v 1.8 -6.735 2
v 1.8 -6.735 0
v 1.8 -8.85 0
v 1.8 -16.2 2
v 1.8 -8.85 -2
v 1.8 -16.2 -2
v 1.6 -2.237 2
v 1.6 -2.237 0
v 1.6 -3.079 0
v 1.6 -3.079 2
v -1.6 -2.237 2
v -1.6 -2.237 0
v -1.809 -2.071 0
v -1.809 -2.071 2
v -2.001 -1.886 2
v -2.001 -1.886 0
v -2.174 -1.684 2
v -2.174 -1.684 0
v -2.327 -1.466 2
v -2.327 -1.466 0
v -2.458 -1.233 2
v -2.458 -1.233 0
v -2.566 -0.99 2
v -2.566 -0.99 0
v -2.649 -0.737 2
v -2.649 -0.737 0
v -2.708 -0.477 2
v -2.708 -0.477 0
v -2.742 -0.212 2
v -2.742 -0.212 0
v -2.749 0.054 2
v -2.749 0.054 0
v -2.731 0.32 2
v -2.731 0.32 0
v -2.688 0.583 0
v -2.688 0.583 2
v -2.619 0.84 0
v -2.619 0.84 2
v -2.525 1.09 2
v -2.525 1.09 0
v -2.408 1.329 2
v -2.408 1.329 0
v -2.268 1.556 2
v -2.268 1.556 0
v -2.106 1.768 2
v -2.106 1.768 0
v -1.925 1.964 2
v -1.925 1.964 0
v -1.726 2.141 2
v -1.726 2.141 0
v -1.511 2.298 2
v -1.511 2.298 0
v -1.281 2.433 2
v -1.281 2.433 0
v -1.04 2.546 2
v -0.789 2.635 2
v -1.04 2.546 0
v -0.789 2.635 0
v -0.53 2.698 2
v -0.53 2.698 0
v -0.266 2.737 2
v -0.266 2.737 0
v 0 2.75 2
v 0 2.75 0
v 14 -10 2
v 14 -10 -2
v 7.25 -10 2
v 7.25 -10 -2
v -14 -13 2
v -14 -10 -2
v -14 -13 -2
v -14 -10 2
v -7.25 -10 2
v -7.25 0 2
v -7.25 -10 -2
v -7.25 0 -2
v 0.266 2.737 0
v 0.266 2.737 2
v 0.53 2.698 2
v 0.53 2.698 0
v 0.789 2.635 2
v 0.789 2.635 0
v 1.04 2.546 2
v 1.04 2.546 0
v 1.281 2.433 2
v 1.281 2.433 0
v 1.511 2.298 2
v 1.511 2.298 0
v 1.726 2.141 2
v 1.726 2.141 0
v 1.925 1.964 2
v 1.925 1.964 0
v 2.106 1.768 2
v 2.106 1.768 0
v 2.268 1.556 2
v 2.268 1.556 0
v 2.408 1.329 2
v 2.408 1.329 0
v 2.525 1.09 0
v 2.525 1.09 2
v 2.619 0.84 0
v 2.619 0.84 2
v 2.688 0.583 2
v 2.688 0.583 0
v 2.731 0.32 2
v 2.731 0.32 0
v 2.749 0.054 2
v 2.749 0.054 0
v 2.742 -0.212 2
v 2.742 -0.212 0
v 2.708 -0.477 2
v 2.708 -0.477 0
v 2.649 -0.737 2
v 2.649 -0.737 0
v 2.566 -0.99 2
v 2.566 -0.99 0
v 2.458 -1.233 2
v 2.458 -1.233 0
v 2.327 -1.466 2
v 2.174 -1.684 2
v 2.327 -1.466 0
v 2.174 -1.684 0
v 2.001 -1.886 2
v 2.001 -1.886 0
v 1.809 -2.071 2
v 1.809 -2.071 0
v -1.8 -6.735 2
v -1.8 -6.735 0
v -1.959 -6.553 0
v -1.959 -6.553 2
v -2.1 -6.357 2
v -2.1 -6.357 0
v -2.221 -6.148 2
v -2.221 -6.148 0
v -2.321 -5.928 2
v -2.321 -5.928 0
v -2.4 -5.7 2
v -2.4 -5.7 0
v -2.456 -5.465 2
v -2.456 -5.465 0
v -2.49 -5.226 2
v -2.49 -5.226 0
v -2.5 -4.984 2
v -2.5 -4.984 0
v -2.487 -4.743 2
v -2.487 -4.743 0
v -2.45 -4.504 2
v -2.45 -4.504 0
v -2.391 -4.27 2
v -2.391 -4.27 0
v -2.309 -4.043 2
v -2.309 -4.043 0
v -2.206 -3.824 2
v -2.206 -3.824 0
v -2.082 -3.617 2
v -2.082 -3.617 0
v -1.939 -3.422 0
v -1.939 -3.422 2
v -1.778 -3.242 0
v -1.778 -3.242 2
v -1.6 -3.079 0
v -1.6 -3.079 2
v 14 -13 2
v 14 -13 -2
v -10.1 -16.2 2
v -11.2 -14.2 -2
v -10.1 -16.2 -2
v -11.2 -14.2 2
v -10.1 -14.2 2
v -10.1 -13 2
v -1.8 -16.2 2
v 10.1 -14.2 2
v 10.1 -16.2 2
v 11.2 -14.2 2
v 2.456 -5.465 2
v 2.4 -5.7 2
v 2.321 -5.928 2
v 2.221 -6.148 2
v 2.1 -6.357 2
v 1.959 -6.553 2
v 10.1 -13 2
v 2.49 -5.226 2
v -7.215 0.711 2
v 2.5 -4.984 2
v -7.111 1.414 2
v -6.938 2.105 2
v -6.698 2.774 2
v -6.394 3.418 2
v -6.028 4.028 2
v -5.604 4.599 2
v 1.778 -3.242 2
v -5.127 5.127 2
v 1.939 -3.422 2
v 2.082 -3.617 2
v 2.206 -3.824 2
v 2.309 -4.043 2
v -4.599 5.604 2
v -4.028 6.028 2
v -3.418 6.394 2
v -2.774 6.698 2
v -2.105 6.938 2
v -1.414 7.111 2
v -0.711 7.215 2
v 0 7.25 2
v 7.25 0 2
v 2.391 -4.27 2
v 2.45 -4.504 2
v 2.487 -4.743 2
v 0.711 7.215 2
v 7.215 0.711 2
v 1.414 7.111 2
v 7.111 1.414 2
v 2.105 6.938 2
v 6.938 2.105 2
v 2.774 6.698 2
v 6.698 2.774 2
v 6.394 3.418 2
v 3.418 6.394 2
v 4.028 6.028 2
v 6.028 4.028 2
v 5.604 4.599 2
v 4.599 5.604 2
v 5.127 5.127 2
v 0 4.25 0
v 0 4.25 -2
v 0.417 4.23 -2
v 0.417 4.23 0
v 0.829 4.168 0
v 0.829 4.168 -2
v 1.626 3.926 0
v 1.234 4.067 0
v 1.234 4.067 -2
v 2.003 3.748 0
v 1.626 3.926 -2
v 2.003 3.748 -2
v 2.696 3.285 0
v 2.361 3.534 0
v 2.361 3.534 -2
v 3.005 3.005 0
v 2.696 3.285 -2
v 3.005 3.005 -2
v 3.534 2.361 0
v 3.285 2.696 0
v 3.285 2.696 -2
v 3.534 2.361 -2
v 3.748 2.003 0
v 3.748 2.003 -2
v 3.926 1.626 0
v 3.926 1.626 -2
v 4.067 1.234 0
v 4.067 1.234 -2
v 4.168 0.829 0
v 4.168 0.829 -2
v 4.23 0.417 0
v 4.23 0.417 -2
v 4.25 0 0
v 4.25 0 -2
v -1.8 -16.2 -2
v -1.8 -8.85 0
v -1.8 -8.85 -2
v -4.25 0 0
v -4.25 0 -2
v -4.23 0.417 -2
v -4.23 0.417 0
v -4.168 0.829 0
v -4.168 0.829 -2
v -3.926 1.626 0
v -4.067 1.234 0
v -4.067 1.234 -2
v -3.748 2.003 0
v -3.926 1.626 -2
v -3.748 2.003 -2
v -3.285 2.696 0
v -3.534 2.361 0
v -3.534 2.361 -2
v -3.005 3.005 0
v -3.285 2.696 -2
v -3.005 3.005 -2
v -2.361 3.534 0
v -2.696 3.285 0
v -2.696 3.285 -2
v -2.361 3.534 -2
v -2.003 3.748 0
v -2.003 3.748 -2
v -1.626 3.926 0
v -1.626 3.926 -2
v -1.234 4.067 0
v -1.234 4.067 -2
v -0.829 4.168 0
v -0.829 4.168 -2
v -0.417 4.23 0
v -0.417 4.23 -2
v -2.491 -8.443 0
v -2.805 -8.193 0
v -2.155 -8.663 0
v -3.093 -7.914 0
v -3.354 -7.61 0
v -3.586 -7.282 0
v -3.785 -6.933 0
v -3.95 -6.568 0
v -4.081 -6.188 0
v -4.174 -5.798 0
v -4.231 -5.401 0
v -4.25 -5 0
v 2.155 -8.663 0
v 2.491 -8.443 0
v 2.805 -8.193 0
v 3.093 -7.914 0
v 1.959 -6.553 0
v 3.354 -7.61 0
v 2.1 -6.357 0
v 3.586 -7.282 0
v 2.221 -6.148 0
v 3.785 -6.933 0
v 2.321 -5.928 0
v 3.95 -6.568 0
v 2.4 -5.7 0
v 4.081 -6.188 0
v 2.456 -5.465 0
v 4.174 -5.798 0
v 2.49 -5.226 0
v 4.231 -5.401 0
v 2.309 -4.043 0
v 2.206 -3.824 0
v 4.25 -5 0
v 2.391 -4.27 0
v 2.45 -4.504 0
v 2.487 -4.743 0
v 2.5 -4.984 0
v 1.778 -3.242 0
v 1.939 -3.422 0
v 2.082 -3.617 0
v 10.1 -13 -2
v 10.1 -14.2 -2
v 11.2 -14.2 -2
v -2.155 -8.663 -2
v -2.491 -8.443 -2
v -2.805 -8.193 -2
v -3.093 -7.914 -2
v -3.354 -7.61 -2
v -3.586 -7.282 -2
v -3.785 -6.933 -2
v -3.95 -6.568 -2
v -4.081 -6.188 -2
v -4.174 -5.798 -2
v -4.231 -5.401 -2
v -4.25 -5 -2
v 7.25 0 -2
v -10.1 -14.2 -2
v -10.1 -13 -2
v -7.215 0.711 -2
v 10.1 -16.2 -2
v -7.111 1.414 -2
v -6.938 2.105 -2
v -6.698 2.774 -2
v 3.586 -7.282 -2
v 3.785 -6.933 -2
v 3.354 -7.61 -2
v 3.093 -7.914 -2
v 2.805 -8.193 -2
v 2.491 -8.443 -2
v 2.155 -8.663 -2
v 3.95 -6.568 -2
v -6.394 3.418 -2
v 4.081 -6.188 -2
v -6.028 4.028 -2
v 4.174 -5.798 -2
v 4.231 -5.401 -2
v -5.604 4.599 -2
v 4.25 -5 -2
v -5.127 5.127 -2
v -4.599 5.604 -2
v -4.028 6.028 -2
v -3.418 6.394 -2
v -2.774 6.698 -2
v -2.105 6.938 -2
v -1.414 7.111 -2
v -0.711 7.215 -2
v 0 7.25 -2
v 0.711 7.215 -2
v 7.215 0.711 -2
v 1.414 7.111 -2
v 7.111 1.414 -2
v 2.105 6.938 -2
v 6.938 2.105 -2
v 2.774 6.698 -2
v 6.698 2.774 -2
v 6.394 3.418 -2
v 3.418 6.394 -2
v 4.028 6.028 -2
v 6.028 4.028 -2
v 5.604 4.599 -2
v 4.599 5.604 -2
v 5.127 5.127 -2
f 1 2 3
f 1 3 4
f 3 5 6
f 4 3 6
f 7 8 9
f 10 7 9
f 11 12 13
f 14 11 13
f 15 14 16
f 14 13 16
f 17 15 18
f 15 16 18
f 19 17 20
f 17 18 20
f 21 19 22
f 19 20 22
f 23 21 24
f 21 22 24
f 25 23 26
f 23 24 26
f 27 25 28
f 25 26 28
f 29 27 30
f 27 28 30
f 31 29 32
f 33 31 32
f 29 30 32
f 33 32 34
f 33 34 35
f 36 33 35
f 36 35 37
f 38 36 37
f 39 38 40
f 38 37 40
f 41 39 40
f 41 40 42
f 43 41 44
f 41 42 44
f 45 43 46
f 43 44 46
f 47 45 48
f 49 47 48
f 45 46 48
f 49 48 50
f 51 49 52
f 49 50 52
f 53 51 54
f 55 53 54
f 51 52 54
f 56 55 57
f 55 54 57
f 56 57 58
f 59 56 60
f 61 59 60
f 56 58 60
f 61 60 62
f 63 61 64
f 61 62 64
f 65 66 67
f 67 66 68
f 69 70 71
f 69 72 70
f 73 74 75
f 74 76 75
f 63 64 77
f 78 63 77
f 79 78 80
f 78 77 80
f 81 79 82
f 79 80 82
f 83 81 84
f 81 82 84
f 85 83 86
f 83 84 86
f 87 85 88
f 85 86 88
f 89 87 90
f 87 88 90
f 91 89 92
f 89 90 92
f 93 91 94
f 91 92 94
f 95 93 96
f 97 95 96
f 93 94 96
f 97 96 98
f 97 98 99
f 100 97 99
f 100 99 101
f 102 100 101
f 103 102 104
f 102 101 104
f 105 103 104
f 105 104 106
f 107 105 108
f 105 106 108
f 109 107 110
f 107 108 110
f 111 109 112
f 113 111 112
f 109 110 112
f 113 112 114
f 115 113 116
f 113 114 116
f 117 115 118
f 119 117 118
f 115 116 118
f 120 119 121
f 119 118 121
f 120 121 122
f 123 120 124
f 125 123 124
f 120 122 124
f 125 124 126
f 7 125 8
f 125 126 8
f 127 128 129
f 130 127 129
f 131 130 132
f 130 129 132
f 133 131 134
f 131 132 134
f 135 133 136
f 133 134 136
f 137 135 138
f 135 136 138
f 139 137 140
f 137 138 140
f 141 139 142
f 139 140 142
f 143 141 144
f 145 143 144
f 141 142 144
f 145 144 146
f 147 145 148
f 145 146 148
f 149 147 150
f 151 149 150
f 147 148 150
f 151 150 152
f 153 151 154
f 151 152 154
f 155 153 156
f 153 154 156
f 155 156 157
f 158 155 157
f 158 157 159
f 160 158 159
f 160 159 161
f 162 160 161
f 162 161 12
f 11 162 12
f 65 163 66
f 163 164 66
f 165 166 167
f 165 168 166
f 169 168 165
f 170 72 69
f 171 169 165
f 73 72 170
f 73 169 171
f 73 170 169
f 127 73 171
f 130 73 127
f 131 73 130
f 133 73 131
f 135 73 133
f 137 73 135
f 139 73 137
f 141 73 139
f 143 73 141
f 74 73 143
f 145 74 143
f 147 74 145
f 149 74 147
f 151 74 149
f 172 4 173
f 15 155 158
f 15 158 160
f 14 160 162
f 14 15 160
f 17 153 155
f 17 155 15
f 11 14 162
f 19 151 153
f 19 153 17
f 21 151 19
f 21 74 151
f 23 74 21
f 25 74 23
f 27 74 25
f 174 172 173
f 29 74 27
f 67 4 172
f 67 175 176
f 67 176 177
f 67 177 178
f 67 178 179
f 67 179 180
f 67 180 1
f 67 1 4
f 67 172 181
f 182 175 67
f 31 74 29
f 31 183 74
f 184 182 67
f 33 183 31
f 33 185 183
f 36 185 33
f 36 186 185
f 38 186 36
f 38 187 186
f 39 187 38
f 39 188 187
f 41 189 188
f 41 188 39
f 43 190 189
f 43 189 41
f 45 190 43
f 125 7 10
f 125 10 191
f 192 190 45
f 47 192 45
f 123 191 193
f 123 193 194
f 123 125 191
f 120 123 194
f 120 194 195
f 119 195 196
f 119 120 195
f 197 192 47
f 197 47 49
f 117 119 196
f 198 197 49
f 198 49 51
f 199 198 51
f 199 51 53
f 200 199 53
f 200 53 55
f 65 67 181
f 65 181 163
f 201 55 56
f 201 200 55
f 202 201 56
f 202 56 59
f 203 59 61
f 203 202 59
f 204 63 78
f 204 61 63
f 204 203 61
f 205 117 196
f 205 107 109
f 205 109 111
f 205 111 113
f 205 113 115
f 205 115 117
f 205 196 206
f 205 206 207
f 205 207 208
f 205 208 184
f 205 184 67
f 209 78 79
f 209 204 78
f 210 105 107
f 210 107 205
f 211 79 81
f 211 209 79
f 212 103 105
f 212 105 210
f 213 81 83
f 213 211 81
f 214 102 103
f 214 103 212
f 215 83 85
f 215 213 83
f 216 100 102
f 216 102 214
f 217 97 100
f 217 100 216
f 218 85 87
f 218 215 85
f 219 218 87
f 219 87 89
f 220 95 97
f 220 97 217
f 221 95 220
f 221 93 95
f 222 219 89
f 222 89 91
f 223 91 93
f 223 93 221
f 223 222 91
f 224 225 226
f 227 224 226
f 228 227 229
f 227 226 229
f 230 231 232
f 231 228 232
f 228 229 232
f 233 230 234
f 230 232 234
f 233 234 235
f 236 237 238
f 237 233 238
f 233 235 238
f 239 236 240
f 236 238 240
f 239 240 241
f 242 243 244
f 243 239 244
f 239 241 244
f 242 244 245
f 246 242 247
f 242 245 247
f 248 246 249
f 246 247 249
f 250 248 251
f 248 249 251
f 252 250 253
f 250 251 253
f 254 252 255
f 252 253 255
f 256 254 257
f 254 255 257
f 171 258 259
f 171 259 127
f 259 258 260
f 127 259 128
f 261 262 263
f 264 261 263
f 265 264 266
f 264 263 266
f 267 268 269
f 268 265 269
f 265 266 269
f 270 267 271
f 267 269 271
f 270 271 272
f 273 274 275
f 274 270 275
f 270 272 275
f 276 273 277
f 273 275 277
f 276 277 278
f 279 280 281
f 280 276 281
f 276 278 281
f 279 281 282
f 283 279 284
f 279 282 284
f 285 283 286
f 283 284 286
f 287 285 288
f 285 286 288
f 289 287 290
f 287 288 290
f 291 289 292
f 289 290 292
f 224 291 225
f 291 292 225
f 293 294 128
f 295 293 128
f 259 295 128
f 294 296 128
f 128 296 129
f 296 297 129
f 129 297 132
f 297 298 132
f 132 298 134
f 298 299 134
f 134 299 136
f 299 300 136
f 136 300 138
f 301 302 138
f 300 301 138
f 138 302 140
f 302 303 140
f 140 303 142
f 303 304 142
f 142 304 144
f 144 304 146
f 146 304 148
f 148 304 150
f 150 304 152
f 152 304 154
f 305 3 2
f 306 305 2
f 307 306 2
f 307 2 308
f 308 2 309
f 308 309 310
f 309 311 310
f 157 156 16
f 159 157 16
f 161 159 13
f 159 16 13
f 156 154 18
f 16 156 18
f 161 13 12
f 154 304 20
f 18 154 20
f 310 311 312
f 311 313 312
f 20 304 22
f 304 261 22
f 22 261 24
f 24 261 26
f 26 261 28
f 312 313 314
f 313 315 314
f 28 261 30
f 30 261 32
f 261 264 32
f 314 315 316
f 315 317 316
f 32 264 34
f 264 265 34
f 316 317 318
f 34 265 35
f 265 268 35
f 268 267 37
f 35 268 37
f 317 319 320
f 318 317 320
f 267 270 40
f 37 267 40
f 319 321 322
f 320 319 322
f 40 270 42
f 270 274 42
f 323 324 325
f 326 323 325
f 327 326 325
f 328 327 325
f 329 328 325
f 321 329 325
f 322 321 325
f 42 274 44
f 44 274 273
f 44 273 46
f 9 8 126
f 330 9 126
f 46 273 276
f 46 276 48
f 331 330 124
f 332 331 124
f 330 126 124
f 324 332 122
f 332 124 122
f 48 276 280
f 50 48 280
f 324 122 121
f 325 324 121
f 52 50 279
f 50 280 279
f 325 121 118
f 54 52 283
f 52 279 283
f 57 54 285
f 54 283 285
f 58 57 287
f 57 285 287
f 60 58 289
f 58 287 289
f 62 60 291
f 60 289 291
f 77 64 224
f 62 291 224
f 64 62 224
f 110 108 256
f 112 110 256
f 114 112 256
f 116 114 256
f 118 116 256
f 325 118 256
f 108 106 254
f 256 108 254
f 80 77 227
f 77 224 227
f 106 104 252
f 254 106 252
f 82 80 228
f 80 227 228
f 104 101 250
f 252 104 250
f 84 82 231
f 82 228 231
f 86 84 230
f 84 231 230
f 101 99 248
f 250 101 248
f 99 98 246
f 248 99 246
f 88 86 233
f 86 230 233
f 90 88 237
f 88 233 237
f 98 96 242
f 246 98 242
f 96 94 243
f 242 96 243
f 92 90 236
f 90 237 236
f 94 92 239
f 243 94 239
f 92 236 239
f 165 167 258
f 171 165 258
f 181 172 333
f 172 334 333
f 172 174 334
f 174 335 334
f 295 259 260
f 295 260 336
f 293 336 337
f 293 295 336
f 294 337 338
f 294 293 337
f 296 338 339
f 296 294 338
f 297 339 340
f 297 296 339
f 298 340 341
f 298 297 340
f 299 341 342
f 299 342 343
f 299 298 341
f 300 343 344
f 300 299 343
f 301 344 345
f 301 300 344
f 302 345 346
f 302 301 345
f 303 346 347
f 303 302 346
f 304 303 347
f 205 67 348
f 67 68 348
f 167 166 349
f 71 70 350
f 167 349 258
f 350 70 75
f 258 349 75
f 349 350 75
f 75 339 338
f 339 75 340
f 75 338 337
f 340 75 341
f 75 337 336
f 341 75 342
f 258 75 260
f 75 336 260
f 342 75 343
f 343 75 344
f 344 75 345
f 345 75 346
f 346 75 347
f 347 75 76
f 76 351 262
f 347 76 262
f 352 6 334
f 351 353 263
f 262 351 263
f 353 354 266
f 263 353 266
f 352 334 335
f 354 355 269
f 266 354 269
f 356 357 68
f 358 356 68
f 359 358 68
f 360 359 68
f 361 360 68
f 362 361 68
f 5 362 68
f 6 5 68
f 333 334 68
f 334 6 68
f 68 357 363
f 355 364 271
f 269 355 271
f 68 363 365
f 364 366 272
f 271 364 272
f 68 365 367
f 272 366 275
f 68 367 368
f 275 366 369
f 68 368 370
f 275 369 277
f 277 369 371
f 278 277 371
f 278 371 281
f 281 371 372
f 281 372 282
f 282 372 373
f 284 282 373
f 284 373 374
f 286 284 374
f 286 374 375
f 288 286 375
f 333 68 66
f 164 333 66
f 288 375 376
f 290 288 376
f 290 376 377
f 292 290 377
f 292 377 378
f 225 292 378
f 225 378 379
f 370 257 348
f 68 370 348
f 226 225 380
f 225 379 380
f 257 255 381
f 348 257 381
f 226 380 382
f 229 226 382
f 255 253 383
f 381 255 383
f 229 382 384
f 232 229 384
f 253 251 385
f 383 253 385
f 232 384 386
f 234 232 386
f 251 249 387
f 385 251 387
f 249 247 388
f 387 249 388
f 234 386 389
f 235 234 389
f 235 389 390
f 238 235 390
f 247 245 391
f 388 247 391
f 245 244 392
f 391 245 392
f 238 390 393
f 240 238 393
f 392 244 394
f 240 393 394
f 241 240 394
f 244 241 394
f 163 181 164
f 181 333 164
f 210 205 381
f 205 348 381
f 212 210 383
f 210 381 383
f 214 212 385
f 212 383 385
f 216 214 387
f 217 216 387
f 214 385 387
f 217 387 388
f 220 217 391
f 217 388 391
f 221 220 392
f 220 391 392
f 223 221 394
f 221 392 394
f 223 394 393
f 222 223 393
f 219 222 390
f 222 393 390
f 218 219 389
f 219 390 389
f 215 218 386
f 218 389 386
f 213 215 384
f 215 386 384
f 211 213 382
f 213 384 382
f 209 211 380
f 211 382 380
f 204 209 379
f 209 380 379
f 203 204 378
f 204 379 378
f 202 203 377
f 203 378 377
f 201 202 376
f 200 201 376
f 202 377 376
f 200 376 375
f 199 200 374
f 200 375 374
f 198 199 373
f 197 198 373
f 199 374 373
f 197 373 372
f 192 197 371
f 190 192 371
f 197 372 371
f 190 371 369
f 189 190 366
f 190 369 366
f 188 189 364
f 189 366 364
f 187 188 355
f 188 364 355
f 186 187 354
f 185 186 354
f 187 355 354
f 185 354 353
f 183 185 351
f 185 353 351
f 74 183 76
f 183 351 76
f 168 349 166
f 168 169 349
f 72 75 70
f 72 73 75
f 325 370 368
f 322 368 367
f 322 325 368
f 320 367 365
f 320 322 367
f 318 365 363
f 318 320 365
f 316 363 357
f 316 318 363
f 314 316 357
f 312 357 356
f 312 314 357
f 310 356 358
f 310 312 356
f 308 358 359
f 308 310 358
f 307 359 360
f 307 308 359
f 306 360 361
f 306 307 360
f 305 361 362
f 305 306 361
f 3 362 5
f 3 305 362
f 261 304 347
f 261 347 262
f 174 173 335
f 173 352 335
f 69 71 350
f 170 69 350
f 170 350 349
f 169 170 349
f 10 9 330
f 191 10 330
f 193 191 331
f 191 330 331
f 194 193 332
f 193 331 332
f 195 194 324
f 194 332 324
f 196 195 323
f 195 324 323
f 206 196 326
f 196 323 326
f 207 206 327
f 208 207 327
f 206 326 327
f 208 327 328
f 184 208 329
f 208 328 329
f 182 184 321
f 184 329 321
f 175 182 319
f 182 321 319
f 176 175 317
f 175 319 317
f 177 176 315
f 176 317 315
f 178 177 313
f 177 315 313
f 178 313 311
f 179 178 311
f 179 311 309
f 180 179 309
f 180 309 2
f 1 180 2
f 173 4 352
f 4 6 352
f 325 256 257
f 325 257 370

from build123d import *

# Parameters (mm, degrees)
F1_DEPTH = 2
F2_DEPTH = 2


with BuildPart() as f1:
    # F0 (on Top) → F1 (new body, symmetric)
    with BuildSketch(Plane.XY):
        with BuildLine():
            ThreePointArc((4.25, -5), (3.5855613229, -7.2817208418), (1.8, -8.85))
            Line((1.8, -8.85), (1.8, -16.2))
            Line((1.8, -16.2), (10.1, -16.2))
            Line((10.1, -16.2), (11.2, -14.2))
            Line((11.2, -14.2), (10.1, -14.2))
            Line((10.1, -14.2), (10.1, -13))
            Line((10.1, -13), (14, -13))
            Line((14, -13), (14, -10))
            Line((14, -10), (7.25, -10))
            Line((7.25, -10), (7.25, -5))
            Line((7.25, -5), (7.25, -2.5))
            Line((7.25, -2.5), (7.25, 0))
            ThreePointArc((7.25, 0), (5.1265241636, 5.1265241636), (0, 7.25))
            ThreePointArc((0, 7.25), (-5.1265241636, 5.1265241636), (-7.25, 0))
            Line((-7.25, 0), (-7.25, -2.5))
            Line((-7.25, -2.5), (-7.25, -5))
            Line((-7.25, -5), (-7.25, -10))
            Line((-7.25, -10), (-14, -10))
            Line((-14, -10), (-14, -13))
            Line((-14, -13), (-10.1, -13))
            Line((-10.1, -13), (-10.1, -14.2))
            Line((-10.1, -14.2), (-11.2, -14.2))
            Line((-11.2, -14.2), (-10.1, -16.2))
            Line((-10.1, -16.2), (-1.8, -16.2))
            Line((-1.8, -16.2), (-1.8, -8.85))
            ThreePointArc((-1.8, -8.85), (-3.5855613229, -7.2817208418), (-4.25, -5))
            Line((-4.25, -5), (-4.25, -2.5))
            Line((-4.25, -2.5), (-4.25, 0))
            ThreePointArc((-4.25, 0), (-3.00520382, 3.00520382), (0, 4.25))
            ThreePointArc((0, 4.25), (3.00520382, 3.00520382), (4.25, 0))
            Line((4.25, 0), (4.25, -2.5))
            Line((4.25, -2.5), (4.25, -5))
        make_face()
    extrude(amount=F1_DEPTH, both=True)

    # F0 (on Top) → F2 (join)
    with BuildSketch(Plane.XY):
        with BuildLine():
            ThreePointArc((0, 2.75), (2.6185133227, 0.8401713984), (1.6, -2.2366269246))
            Line((1.6, -2.2366269246), (1.6, -3.0790627288))
            ThreePointArc((1.6, -3.0790627288), (2.4962673742, -4.8634379387), (1.8, -6.7349351573))
            Line((1.8, -6.7349351573), (1.8, -8.85))
            ThreePointArc((1.8, -8.85), (3.5855613229, -7.2817208418), (4.25, -5))
            Line((4.25, -5), (4.25, -2.5))
            Line((4.25, -2.5), (4.25, 0))
            ThreePointArc((4.25, 0), (3.00520382, 3.00520382), (0, 4.25))
            ThreePointArc((0, 4.25), (-3.00520382, 3.00520382), (-4.25, 0))
            Line((-4.25, 0), (-4.25, -2.5))
            Line((-4.25, -2.5), (-4.25, -5))
            ThreePointArc((-4.25, -5), (-3.5855613229, -7.2817208418), (-1.8, -8.85))
            Line((-1.8, -8.85), (-1.8, -6.7349351573))
            ThreePointArc((-1.8, -6.7349351573), (-2.4962673742, -4.8634379387), (-1.6, -3.0790627288))
            Line((-1.6, -3.0790627288), (-1.6, -2.2366269246))
            ThreePointArc((-1.6, -2.2366269246), (-2.6185133227, 0.8401713984), (0, 2.75))
        make_face()
    extrude(amount=F2_DEPTH)


solid = f1.part
